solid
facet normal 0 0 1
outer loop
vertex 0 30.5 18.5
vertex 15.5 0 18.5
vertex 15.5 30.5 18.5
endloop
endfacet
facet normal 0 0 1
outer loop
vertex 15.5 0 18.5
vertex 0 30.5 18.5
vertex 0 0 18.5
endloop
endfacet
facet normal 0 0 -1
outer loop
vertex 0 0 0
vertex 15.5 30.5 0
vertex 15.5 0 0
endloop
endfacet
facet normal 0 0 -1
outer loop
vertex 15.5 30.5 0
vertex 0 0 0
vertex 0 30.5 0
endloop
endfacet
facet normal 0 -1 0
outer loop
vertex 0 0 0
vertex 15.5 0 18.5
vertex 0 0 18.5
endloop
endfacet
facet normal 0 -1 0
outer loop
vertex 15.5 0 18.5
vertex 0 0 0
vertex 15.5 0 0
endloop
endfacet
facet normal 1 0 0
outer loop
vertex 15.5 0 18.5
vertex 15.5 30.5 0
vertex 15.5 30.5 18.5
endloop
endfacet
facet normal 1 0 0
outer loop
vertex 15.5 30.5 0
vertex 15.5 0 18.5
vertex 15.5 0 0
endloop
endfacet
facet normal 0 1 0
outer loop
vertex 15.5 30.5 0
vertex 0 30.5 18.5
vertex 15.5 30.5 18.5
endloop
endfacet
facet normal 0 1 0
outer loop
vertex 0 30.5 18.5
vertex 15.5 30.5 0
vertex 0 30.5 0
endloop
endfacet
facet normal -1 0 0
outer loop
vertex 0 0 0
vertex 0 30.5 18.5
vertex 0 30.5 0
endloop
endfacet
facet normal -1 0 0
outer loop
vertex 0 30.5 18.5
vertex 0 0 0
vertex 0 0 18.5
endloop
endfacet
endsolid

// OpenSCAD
// all dimensions in millimeters [in]

// parameters
width_outer = 15.5;
length_outer = 30.5;
height_outer = 18.5;
body_size = [
  width_outer,
  length_outer,
  height_outer
];

// rough model
module body() {
  color("grey") cube(size=body_size, center=false);
}

// render
body();
